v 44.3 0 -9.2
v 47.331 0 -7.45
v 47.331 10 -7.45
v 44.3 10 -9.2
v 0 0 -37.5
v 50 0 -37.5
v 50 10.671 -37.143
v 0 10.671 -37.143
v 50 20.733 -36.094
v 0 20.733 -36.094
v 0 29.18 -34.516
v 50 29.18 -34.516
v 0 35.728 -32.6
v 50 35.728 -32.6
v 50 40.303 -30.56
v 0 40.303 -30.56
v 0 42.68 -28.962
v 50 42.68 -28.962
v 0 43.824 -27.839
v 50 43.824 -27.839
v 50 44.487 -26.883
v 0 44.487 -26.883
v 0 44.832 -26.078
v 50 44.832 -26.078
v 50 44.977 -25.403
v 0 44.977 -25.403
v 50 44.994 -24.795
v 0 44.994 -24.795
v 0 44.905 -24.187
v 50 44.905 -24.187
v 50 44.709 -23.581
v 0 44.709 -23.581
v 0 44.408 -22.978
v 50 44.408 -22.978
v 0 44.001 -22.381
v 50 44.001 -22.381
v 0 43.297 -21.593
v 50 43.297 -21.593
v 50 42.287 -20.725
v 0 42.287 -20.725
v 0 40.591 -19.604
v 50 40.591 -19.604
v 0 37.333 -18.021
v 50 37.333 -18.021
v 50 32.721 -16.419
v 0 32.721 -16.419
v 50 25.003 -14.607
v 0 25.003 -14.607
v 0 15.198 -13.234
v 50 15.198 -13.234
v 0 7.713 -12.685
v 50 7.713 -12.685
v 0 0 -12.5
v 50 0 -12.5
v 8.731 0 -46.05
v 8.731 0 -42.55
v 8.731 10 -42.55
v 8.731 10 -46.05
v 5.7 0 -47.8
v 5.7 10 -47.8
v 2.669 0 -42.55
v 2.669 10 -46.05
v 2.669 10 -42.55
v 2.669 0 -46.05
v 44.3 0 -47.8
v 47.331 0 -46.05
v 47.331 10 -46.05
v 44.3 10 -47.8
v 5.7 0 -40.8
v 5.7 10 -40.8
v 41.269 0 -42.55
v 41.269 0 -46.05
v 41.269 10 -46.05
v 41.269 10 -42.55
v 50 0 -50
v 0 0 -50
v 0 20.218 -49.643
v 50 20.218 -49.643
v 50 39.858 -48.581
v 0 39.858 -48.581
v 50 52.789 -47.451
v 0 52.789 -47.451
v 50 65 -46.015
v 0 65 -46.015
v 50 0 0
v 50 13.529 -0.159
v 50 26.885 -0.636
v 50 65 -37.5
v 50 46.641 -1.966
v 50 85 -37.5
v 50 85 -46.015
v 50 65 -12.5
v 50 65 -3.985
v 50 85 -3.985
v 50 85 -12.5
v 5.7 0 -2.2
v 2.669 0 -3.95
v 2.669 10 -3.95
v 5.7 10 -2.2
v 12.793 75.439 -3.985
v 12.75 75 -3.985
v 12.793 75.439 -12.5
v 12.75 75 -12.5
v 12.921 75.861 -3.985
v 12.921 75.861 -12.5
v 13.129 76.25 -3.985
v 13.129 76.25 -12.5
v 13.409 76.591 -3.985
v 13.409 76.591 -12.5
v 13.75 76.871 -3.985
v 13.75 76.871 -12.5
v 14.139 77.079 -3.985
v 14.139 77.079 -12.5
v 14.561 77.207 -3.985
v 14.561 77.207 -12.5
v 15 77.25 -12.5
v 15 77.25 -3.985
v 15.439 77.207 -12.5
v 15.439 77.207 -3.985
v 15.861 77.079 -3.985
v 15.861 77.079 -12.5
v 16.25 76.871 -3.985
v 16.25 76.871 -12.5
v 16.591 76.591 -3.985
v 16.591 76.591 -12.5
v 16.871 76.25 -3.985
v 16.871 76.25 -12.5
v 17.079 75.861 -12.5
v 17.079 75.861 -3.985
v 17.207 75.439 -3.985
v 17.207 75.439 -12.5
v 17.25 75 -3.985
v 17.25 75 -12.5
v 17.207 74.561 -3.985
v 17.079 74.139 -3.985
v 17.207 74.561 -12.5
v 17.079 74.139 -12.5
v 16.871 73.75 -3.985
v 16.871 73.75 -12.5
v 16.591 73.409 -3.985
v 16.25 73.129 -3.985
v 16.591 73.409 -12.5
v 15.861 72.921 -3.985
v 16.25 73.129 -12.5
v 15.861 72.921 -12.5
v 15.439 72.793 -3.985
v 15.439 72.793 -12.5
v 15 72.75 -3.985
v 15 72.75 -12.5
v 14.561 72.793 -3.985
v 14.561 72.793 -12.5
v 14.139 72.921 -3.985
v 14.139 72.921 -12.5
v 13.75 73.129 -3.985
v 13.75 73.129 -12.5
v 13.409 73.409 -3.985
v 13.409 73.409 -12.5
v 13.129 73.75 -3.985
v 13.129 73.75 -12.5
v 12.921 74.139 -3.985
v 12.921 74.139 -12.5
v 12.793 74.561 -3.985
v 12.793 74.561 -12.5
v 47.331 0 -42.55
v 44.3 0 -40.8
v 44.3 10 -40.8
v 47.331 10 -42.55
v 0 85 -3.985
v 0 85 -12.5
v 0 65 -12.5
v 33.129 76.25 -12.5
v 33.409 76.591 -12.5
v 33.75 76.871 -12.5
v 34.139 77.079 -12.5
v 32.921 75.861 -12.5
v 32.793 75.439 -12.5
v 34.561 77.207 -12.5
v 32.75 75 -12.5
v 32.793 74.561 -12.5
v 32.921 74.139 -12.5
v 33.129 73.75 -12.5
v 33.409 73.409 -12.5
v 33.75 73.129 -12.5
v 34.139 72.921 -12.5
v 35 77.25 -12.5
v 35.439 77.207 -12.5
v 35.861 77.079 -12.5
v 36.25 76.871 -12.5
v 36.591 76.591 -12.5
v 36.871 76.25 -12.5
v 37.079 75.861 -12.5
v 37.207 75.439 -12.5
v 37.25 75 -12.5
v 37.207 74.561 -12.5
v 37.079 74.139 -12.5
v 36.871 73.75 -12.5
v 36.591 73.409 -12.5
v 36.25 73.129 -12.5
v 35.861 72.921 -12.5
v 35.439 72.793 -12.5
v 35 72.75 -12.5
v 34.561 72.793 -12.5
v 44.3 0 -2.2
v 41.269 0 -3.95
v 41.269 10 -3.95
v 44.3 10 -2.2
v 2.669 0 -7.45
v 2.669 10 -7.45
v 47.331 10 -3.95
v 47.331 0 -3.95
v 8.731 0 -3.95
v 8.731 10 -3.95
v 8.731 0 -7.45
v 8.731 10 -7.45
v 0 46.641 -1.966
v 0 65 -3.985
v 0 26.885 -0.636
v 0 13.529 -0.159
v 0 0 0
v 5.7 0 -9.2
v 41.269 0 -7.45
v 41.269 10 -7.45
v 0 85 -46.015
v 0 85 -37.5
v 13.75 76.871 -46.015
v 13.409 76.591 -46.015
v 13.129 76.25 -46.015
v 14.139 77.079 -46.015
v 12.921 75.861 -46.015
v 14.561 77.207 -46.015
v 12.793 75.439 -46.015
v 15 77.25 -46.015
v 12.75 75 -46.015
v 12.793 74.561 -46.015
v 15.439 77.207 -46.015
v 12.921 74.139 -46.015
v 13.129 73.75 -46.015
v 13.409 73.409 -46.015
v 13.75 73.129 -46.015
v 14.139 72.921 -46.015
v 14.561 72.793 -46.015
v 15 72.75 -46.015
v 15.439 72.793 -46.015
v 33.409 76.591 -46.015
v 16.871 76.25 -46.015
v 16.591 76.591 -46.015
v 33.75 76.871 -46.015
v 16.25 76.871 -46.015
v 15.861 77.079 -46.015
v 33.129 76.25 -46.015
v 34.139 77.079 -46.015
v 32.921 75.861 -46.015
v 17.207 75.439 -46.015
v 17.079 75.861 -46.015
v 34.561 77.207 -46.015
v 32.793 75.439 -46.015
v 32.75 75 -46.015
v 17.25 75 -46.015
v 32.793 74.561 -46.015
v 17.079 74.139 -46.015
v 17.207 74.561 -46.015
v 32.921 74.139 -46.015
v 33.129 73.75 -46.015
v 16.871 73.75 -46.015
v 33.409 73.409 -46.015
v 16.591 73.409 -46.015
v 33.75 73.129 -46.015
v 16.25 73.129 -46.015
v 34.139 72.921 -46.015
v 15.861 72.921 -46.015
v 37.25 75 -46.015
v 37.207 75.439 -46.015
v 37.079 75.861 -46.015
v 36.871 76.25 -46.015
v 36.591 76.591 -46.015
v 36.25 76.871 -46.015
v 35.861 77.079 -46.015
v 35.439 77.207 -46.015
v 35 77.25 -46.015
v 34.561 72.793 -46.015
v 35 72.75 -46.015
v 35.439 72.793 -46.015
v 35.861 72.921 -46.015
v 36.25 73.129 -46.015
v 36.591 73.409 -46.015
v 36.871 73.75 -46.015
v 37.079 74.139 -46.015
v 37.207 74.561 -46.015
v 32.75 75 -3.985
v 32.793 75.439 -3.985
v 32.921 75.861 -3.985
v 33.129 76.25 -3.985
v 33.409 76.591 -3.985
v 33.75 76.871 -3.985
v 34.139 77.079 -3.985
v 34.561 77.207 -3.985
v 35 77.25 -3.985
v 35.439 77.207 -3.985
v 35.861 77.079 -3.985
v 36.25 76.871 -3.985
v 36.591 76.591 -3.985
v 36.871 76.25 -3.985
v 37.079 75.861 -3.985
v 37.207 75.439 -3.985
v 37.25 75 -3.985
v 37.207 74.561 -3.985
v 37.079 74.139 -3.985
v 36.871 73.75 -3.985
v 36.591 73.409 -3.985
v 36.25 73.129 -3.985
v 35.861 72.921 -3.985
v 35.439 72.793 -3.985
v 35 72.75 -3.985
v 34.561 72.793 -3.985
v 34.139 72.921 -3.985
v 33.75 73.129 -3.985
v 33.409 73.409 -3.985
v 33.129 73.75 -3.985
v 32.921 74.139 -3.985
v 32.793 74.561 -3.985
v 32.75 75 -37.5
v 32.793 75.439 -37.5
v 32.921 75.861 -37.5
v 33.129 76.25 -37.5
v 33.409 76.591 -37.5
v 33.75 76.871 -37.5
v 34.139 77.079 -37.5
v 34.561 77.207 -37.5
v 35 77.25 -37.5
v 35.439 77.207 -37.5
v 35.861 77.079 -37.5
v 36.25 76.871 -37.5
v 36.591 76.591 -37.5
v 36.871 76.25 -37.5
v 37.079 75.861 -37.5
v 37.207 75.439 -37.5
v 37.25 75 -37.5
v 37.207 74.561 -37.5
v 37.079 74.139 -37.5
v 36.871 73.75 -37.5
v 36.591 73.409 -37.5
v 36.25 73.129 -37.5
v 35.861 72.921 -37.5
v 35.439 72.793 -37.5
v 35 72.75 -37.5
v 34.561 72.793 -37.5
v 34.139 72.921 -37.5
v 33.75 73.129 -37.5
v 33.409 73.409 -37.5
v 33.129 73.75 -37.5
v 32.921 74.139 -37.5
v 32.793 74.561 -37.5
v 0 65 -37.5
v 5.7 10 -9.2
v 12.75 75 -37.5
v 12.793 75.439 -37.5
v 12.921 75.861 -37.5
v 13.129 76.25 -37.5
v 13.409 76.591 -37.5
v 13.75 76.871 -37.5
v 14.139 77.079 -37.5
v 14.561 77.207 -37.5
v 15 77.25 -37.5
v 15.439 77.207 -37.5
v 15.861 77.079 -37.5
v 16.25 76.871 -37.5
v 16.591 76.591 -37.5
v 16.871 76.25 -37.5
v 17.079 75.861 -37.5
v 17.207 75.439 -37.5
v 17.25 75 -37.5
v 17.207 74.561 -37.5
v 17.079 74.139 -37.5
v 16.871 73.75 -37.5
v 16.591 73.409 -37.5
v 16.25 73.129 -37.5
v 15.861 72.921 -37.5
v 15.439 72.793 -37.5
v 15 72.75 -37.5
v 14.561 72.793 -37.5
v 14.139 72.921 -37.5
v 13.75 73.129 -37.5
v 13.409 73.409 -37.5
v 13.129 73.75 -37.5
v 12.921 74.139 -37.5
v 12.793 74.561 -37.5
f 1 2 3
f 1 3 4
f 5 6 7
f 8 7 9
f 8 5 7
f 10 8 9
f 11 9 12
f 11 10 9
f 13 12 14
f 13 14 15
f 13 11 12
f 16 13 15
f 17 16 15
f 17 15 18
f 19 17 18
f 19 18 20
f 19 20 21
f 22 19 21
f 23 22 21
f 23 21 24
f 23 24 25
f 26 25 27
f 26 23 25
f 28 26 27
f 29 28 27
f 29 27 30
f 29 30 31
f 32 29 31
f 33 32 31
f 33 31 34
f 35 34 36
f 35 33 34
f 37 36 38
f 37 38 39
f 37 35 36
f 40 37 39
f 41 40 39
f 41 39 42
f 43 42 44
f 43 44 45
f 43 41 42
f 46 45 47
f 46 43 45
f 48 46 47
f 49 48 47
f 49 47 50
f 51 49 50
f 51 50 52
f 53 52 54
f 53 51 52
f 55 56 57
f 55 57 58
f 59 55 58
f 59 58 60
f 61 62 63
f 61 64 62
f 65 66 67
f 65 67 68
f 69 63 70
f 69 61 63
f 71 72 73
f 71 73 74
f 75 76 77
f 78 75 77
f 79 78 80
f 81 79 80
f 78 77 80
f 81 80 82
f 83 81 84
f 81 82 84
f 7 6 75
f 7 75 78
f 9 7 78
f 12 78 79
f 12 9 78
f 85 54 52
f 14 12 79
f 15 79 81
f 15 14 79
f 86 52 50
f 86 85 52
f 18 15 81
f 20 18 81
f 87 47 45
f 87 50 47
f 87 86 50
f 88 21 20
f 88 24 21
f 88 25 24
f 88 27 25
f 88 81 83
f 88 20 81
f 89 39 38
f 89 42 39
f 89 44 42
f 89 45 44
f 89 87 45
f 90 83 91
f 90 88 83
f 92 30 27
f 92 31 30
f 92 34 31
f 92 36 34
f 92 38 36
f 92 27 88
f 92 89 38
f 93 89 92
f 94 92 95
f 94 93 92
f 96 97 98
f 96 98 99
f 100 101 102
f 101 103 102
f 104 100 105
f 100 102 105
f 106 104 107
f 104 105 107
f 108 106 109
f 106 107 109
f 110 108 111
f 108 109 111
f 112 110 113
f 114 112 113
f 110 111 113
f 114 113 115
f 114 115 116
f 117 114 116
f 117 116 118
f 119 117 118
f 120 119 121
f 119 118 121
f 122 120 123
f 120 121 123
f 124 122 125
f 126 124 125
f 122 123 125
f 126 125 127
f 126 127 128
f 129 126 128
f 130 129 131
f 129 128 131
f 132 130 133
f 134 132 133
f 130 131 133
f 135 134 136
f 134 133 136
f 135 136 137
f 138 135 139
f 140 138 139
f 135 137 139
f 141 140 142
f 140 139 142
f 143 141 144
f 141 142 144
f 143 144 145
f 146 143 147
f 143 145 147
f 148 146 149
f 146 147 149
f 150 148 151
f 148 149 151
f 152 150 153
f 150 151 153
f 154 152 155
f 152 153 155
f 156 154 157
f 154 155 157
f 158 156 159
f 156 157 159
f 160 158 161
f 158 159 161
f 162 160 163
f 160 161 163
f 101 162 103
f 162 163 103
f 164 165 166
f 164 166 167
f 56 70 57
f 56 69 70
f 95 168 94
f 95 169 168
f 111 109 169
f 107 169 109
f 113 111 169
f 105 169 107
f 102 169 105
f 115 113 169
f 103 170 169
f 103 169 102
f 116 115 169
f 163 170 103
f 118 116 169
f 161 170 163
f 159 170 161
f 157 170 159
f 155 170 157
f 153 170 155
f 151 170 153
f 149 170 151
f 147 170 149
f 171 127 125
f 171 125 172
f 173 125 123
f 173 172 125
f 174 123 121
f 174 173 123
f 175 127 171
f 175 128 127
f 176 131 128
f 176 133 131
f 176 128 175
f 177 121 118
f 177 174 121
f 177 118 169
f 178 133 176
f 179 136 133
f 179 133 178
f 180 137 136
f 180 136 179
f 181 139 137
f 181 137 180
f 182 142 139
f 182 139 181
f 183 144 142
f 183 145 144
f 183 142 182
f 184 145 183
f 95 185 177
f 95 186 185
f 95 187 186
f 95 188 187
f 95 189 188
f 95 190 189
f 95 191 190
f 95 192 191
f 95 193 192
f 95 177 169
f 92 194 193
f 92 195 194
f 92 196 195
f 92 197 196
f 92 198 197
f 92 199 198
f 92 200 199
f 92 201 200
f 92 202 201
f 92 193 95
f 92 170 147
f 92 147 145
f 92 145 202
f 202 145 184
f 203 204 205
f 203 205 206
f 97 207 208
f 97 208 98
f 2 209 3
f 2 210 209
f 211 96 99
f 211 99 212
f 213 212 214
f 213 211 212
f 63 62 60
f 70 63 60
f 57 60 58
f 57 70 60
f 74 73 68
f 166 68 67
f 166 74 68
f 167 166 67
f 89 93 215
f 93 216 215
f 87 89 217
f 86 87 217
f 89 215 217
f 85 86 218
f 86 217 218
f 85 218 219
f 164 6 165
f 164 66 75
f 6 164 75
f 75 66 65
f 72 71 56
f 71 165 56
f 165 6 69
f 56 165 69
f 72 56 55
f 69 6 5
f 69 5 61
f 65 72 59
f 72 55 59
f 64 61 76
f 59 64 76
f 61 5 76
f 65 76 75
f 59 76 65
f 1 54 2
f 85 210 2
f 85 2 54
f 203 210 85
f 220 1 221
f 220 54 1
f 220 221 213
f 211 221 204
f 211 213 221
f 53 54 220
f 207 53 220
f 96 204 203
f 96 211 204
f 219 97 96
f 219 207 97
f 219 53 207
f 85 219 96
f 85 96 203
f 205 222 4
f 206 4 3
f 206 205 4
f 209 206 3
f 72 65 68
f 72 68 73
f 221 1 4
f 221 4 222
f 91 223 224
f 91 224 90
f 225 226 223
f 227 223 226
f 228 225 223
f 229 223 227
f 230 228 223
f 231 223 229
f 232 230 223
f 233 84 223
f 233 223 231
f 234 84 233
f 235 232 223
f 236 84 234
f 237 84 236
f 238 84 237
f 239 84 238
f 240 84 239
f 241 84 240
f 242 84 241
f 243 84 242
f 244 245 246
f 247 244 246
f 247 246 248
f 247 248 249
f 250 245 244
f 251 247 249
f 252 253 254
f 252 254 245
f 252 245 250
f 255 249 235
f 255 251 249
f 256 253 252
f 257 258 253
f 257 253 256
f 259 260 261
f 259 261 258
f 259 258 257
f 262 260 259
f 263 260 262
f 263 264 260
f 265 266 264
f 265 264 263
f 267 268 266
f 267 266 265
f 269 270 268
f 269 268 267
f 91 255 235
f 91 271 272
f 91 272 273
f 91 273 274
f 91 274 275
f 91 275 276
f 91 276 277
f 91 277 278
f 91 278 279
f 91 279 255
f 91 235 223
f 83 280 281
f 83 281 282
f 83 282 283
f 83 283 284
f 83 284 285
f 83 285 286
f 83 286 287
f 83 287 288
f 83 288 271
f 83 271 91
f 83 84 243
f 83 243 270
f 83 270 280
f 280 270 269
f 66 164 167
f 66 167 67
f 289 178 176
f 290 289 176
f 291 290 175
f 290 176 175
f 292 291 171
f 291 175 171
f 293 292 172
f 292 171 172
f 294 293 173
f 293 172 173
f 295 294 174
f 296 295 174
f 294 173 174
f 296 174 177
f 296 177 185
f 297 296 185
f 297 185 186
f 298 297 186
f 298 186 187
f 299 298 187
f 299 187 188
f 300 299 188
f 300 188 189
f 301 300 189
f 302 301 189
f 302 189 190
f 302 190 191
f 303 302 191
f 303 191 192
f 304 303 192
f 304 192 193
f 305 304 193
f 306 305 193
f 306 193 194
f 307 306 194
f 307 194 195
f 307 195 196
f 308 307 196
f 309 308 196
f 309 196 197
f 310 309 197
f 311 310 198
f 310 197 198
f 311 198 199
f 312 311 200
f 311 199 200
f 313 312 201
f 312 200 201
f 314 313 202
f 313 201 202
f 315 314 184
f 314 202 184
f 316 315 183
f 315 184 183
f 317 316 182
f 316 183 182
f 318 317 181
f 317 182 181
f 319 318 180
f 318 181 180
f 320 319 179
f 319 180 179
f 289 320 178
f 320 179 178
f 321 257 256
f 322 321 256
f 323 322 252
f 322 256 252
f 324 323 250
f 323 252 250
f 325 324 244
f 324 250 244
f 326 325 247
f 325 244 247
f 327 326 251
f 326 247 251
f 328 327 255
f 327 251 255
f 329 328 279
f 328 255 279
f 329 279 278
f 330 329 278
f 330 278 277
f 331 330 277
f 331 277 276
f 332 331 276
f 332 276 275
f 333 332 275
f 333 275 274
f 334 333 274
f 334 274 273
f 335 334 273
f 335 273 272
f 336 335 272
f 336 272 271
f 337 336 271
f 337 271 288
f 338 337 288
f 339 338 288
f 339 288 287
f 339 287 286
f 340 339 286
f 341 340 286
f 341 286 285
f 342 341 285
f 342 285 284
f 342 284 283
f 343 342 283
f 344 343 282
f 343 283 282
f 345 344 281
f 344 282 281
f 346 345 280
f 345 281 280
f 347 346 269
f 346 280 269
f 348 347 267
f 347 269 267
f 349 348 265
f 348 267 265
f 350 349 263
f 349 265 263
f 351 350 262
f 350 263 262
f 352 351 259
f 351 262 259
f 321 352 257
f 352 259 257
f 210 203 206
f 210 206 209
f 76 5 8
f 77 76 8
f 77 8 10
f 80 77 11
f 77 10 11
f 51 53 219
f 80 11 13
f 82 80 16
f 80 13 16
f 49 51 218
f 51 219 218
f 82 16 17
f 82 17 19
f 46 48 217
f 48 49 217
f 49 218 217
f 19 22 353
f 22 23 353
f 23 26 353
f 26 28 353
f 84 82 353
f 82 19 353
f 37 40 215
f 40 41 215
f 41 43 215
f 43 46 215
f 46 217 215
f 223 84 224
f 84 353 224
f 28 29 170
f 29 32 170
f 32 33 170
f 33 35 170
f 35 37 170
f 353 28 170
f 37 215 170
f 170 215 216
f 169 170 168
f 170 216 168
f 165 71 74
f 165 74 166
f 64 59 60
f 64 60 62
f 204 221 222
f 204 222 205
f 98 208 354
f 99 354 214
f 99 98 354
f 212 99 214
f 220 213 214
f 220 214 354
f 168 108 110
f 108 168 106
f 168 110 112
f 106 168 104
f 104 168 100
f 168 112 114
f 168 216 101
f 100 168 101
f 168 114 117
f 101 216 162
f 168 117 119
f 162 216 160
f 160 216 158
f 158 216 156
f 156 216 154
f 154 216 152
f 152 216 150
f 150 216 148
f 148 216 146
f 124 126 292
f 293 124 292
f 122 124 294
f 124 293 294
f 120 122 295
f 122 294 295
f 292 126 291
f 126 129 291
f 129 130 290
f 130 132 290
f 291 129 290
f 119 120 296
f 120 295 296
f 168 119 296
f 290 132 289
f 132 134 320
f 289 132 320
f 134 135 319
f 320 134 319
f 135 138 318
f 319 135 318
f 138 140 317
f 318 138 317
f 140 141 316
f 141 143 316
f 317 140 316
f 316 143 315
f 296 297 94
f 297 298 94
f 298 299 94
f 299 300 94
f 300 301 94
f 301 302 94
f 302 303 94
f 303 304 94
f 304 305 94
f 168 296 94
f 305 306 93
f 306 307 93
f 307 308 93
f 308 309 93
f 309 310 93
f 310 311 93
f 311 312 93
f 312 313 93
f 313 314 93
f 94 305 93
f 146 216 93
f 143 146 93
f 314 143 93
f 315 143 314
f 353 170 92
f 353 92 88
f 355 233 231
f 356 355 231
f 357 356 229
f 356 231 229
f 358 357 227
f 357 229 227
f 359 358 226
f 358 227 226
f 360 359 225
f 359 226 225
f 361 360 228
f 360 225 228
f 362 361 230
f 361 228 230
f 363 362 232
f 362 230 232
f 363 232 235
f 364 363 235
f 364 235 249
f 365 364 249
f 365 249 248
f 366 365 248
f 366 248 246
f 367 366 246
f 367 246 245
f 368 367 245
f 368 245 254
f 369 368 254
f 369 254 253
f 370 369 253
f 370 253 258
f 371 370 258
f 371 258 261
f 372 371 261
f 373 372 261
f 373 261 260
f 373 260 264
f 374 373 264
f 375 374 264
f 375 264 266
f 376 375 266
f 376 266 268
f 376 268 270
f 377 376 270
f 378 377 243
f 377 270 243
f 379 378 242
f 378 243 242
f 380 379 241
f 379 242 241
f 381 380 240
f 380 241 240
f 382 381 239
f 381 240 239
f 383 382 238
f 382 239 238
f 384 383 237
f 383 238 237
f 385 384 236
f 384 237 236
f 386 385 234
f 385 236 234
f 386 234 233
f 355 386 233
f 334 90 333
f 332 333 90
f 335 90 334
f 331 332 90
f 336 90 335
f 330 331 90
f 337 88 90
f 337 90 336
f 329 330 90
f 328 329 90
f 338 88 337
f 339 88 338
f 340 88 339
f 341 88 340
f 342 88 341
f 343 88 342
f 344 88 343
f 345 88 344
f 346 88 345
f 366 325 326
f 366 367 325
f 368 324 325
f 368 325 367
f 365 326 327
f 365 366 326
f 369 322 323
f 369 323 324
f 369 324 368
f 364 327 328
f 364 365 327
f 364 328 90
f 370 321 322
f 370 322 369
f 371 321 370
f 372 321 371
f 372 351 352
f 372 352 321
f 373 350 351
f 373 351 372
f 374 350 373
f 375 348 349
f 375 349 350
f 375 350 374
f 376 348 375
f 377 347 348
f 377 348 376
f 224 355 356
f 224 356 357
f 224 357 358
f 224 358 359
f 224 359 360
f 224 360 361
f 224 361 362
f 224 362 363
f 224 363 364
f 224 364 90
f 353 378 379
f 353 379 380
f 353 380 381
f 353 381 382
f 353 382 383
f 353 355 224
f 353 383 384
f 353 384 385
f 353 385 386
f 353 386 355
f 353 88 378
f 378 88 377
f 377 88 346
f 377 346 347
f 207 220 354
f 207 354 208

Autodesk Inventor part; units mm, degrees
ref_plane "YZ Plane" through (0, 0, 0) normal (1, 0, 0) x (0, 1, 0)
ref_plane "XZ Plane" through (0, 0, 0) normal (0, 1, 0) x (-1, 0, 0)
ref_plane "XY Plane" through (0, 0, 0) normal (0, 0, 1) x (1, 0, 0)
sketch "Sketch1" plane through (0, 0, 0) normal (1, 0, 0) x (0, 1, 0)
  ellipse E0 centre (0, -25) end of major axis (45, -25) minor radius 12.5 (0, -37.5) -> (0, -12.5) ccw
  ellipse E1 centre (0, -25) end of major axis (120, -25) minor radius 25 (0, -50) -> (0, 0) ccw
  line L0 (65, -3.9852) -> (65, -46.0148)
  line L1 (0, -37.5) -> (0, -50)
  line L2 (0, -12.5) -> (0, 0)
  point P0 (0, -43.75)
  point P1 (0, -6.25)
  dimension "d23" = 45
  dimension "d25" = 120
  dimension "d18" = 50
  dimension "d22" = 25
  dimension "d24" = 65
extrude "Extrusion1" add sketch "Sketch1" along normal blind 50 contours E0 L2 E1 L0 L1
sketch "Sketch3" plane through (0, 65, -3.9852) normal (0, 1, 0) x (1, 0, 0)
  line L0 (0, 42.0297) -> (0, 0) projected
  line L1 (0, 0) -> (50, 0) projected
  line L2 (50, 42.0297) -> (50, 0) projected
  line L3 (0, 42.0297) -> (50, 42.0297) projected
  line L4 (0, 33.5148) -> (0, 8.5148) projected
  line L5 (50, 0) -> (0, 0)
  line L6 (0, 0) -> (0, 8.5148)
  line L7 (0, 8.5148) -> (50, 8.5148)
  line L8 (50, 8.5148) -> (50, 0)
  line L9 (0, 42.0297) -> (50, 42.0297)
  line L10 (50, 42.0297) -> (50, 33.5148)
  line L11 (50, 33.5148) -> (0, 33.5148)
  line L12 (0, 33.5148) -> (0, 42.0297)
  point P0 (0, -3.9852)
  point P1 (0, 33.5148)
  dimension "d26" = 25
  dimension "d27" = 8.5148
  dimension "d28" = 8.5148
extrude "Extrusion3" add sketch "Sketch3" along normal blind 20 contours L3 L2 L11 L0 | L7 L2 L1 L0
sketch "Sketch4" plane through (50, 65, -46.0148) normal (0, 0, -1) x (-1, 0, 0)
  line L0 (50, 0) -> (0, 0) projected
  line L1 (50, 0) -> (50, 20) projected
  line L2 (0, 20) -> (50, 20) projected
  line L3 (0, 0) -> (0, 20) projected
  line L4 (0, 0) -> (0, 20) projected
  line L5 (0, 10) -> (50, 10)
  circle A0 centre (15, 10) radius 2.25
  circle A1 centre (35, 10) radius 2.25
  point P0 (50, -65)
  dimension "d31" = 4.5
  dimension "d32" = 4.5
  dimension "d33" = 20
  dimension "d34" = 15
  dimension "d35" = 15
extrude "Extrusion4" cut sketch "Sketch4" against normal through all contours A1 L5 | L5 A1 | A0 L5 | L5 A0
sketch "Sketch5" plane through (0, 0, -12.5) normal (0, -1, 0) x (1, 0, 0)
  line L0 (0, 12.5) -> (0, 0) projected
  line L1 (0, 0) -> (50, 0) projected
  line L2 (50, 12.5) -> (50, 0) projected
  line L3 (0, 12.5) -> (50, 12.5) projected
  line L4 (0, -25) -> (0, -37.5) projected
  line L5 (0, -37.5) -> (50, -37.5) projected
  line L6 (50, -25) -> (50, -37.5) projected
  line L7 (0, -25) -> (50, -25) projected
  line L8 (50, 8.5148) -> (50, 12.5) projected
  line L9 (0, -25) -> (0, -37.5) projected
  line L10 (50, 12.5) -> (0, -37.5)
  line L11 (5.7, 6.8) -> (44.3, 6.8)
  line L12 (44.3, 6.8) -> (44.3, -31.8)
  line L13 (44.3, -31.8) -> (5.7, -31.8)
  line L14 (5.7, -31.8) -> (5.7, 6.8)
  line L15 (5.7, 6.8) -> (44.3, -31.8) construction
  line L16 (44.3, 6.8) -> (5.7, -31.8) construction
  line L17 (44.3, 3.3) -> (41.2689, 5.05)
  line L18 (41.2689, 5.05) -> (41.2689, 8.55)
  line L19 (41.2689, 8.55) -> (44.3, 10.3)
  line L20 (44.3, 10.3) -> (47.3311, 8.55)
  line L21 (47.3311, 8.55) -> (47.3311, 5.05)
  line L22 (47.3311, 5.05) -> (44.3, 3.3)
  line L23 (41.2689, -33.55) -> (41.2689, -30.05)
  line L24 (41.2689, -30.05) -> (44.3, -28.3)
  line L25 (44.3, -28.3) -> (47.3311, -30.05)
  line L26 (47.3311, -30.05) -> (47.3311, -33.55)
  line L27 (47.3311, -33.55) -> (44.3, -35.3)
  line L28 (44.3, -35.3) -> (41.2689, -33.55)
  line L29 (8.7311, -30.05) -> (8.7311, -33.55)
  line L30 (8.7311, -33.55) -> (5.7, -35.3)
  line L31 (5.7, -35.3) -> (2.6689, -33.55)
  line L32 (2.6689, -33.55) -> (2.6689, -30.05)
  line L33 (2.6689, -30.05) -> (5.7, -28.3)
  line L34 (5.7, -28.3) -> (8.7311, -30.05)
  line L35 (8.7311, 8.55) -> (8.7311, 5.05)
  line L36 (8.7311, 5.05) -> (5.7, 3.3)
  line L37 (5.7, 3.3) -> (2.6689, 5.05)
  line L38 (2.6689, 5.05) -> (2.6689, 8.55)
  line L39 (2.6689, 8.55) -> (5.7, 10.3)
  line L40 (5.7, 10.3) -> (8.7311, 8.55)
  point P0 (25, -12.5)
  dimension "d38" = 38.6
  dimension "d39" = 38.6
  dimension "d40" = 7
  dimension "d41" = 7
  dimension "d42" = 7
  dimension "d43" = 7
extrude "Extrusion5" cut sketch "Sketch5" against normal blind 10 contours L20 L21 L22 L12 L10 | L10 L11 L18 L19 L20 | L37 L38 L39 L40 L35 L11 L14 | L14 L11 L35 L36 | L12 L17 L10 | L10 L17 L18 L11 | L34 L10 L14 | L14 L10 L31 L32 L33 | L34 L29 L13 L10 | L13 L29 L30 L31 L10 | L25 L26 L27 L28 L23 L13 L12 | L12 L13 L23 L24
equation "\"d27\" = d28"
properties part number "Arch" material "ABS Plastic"
